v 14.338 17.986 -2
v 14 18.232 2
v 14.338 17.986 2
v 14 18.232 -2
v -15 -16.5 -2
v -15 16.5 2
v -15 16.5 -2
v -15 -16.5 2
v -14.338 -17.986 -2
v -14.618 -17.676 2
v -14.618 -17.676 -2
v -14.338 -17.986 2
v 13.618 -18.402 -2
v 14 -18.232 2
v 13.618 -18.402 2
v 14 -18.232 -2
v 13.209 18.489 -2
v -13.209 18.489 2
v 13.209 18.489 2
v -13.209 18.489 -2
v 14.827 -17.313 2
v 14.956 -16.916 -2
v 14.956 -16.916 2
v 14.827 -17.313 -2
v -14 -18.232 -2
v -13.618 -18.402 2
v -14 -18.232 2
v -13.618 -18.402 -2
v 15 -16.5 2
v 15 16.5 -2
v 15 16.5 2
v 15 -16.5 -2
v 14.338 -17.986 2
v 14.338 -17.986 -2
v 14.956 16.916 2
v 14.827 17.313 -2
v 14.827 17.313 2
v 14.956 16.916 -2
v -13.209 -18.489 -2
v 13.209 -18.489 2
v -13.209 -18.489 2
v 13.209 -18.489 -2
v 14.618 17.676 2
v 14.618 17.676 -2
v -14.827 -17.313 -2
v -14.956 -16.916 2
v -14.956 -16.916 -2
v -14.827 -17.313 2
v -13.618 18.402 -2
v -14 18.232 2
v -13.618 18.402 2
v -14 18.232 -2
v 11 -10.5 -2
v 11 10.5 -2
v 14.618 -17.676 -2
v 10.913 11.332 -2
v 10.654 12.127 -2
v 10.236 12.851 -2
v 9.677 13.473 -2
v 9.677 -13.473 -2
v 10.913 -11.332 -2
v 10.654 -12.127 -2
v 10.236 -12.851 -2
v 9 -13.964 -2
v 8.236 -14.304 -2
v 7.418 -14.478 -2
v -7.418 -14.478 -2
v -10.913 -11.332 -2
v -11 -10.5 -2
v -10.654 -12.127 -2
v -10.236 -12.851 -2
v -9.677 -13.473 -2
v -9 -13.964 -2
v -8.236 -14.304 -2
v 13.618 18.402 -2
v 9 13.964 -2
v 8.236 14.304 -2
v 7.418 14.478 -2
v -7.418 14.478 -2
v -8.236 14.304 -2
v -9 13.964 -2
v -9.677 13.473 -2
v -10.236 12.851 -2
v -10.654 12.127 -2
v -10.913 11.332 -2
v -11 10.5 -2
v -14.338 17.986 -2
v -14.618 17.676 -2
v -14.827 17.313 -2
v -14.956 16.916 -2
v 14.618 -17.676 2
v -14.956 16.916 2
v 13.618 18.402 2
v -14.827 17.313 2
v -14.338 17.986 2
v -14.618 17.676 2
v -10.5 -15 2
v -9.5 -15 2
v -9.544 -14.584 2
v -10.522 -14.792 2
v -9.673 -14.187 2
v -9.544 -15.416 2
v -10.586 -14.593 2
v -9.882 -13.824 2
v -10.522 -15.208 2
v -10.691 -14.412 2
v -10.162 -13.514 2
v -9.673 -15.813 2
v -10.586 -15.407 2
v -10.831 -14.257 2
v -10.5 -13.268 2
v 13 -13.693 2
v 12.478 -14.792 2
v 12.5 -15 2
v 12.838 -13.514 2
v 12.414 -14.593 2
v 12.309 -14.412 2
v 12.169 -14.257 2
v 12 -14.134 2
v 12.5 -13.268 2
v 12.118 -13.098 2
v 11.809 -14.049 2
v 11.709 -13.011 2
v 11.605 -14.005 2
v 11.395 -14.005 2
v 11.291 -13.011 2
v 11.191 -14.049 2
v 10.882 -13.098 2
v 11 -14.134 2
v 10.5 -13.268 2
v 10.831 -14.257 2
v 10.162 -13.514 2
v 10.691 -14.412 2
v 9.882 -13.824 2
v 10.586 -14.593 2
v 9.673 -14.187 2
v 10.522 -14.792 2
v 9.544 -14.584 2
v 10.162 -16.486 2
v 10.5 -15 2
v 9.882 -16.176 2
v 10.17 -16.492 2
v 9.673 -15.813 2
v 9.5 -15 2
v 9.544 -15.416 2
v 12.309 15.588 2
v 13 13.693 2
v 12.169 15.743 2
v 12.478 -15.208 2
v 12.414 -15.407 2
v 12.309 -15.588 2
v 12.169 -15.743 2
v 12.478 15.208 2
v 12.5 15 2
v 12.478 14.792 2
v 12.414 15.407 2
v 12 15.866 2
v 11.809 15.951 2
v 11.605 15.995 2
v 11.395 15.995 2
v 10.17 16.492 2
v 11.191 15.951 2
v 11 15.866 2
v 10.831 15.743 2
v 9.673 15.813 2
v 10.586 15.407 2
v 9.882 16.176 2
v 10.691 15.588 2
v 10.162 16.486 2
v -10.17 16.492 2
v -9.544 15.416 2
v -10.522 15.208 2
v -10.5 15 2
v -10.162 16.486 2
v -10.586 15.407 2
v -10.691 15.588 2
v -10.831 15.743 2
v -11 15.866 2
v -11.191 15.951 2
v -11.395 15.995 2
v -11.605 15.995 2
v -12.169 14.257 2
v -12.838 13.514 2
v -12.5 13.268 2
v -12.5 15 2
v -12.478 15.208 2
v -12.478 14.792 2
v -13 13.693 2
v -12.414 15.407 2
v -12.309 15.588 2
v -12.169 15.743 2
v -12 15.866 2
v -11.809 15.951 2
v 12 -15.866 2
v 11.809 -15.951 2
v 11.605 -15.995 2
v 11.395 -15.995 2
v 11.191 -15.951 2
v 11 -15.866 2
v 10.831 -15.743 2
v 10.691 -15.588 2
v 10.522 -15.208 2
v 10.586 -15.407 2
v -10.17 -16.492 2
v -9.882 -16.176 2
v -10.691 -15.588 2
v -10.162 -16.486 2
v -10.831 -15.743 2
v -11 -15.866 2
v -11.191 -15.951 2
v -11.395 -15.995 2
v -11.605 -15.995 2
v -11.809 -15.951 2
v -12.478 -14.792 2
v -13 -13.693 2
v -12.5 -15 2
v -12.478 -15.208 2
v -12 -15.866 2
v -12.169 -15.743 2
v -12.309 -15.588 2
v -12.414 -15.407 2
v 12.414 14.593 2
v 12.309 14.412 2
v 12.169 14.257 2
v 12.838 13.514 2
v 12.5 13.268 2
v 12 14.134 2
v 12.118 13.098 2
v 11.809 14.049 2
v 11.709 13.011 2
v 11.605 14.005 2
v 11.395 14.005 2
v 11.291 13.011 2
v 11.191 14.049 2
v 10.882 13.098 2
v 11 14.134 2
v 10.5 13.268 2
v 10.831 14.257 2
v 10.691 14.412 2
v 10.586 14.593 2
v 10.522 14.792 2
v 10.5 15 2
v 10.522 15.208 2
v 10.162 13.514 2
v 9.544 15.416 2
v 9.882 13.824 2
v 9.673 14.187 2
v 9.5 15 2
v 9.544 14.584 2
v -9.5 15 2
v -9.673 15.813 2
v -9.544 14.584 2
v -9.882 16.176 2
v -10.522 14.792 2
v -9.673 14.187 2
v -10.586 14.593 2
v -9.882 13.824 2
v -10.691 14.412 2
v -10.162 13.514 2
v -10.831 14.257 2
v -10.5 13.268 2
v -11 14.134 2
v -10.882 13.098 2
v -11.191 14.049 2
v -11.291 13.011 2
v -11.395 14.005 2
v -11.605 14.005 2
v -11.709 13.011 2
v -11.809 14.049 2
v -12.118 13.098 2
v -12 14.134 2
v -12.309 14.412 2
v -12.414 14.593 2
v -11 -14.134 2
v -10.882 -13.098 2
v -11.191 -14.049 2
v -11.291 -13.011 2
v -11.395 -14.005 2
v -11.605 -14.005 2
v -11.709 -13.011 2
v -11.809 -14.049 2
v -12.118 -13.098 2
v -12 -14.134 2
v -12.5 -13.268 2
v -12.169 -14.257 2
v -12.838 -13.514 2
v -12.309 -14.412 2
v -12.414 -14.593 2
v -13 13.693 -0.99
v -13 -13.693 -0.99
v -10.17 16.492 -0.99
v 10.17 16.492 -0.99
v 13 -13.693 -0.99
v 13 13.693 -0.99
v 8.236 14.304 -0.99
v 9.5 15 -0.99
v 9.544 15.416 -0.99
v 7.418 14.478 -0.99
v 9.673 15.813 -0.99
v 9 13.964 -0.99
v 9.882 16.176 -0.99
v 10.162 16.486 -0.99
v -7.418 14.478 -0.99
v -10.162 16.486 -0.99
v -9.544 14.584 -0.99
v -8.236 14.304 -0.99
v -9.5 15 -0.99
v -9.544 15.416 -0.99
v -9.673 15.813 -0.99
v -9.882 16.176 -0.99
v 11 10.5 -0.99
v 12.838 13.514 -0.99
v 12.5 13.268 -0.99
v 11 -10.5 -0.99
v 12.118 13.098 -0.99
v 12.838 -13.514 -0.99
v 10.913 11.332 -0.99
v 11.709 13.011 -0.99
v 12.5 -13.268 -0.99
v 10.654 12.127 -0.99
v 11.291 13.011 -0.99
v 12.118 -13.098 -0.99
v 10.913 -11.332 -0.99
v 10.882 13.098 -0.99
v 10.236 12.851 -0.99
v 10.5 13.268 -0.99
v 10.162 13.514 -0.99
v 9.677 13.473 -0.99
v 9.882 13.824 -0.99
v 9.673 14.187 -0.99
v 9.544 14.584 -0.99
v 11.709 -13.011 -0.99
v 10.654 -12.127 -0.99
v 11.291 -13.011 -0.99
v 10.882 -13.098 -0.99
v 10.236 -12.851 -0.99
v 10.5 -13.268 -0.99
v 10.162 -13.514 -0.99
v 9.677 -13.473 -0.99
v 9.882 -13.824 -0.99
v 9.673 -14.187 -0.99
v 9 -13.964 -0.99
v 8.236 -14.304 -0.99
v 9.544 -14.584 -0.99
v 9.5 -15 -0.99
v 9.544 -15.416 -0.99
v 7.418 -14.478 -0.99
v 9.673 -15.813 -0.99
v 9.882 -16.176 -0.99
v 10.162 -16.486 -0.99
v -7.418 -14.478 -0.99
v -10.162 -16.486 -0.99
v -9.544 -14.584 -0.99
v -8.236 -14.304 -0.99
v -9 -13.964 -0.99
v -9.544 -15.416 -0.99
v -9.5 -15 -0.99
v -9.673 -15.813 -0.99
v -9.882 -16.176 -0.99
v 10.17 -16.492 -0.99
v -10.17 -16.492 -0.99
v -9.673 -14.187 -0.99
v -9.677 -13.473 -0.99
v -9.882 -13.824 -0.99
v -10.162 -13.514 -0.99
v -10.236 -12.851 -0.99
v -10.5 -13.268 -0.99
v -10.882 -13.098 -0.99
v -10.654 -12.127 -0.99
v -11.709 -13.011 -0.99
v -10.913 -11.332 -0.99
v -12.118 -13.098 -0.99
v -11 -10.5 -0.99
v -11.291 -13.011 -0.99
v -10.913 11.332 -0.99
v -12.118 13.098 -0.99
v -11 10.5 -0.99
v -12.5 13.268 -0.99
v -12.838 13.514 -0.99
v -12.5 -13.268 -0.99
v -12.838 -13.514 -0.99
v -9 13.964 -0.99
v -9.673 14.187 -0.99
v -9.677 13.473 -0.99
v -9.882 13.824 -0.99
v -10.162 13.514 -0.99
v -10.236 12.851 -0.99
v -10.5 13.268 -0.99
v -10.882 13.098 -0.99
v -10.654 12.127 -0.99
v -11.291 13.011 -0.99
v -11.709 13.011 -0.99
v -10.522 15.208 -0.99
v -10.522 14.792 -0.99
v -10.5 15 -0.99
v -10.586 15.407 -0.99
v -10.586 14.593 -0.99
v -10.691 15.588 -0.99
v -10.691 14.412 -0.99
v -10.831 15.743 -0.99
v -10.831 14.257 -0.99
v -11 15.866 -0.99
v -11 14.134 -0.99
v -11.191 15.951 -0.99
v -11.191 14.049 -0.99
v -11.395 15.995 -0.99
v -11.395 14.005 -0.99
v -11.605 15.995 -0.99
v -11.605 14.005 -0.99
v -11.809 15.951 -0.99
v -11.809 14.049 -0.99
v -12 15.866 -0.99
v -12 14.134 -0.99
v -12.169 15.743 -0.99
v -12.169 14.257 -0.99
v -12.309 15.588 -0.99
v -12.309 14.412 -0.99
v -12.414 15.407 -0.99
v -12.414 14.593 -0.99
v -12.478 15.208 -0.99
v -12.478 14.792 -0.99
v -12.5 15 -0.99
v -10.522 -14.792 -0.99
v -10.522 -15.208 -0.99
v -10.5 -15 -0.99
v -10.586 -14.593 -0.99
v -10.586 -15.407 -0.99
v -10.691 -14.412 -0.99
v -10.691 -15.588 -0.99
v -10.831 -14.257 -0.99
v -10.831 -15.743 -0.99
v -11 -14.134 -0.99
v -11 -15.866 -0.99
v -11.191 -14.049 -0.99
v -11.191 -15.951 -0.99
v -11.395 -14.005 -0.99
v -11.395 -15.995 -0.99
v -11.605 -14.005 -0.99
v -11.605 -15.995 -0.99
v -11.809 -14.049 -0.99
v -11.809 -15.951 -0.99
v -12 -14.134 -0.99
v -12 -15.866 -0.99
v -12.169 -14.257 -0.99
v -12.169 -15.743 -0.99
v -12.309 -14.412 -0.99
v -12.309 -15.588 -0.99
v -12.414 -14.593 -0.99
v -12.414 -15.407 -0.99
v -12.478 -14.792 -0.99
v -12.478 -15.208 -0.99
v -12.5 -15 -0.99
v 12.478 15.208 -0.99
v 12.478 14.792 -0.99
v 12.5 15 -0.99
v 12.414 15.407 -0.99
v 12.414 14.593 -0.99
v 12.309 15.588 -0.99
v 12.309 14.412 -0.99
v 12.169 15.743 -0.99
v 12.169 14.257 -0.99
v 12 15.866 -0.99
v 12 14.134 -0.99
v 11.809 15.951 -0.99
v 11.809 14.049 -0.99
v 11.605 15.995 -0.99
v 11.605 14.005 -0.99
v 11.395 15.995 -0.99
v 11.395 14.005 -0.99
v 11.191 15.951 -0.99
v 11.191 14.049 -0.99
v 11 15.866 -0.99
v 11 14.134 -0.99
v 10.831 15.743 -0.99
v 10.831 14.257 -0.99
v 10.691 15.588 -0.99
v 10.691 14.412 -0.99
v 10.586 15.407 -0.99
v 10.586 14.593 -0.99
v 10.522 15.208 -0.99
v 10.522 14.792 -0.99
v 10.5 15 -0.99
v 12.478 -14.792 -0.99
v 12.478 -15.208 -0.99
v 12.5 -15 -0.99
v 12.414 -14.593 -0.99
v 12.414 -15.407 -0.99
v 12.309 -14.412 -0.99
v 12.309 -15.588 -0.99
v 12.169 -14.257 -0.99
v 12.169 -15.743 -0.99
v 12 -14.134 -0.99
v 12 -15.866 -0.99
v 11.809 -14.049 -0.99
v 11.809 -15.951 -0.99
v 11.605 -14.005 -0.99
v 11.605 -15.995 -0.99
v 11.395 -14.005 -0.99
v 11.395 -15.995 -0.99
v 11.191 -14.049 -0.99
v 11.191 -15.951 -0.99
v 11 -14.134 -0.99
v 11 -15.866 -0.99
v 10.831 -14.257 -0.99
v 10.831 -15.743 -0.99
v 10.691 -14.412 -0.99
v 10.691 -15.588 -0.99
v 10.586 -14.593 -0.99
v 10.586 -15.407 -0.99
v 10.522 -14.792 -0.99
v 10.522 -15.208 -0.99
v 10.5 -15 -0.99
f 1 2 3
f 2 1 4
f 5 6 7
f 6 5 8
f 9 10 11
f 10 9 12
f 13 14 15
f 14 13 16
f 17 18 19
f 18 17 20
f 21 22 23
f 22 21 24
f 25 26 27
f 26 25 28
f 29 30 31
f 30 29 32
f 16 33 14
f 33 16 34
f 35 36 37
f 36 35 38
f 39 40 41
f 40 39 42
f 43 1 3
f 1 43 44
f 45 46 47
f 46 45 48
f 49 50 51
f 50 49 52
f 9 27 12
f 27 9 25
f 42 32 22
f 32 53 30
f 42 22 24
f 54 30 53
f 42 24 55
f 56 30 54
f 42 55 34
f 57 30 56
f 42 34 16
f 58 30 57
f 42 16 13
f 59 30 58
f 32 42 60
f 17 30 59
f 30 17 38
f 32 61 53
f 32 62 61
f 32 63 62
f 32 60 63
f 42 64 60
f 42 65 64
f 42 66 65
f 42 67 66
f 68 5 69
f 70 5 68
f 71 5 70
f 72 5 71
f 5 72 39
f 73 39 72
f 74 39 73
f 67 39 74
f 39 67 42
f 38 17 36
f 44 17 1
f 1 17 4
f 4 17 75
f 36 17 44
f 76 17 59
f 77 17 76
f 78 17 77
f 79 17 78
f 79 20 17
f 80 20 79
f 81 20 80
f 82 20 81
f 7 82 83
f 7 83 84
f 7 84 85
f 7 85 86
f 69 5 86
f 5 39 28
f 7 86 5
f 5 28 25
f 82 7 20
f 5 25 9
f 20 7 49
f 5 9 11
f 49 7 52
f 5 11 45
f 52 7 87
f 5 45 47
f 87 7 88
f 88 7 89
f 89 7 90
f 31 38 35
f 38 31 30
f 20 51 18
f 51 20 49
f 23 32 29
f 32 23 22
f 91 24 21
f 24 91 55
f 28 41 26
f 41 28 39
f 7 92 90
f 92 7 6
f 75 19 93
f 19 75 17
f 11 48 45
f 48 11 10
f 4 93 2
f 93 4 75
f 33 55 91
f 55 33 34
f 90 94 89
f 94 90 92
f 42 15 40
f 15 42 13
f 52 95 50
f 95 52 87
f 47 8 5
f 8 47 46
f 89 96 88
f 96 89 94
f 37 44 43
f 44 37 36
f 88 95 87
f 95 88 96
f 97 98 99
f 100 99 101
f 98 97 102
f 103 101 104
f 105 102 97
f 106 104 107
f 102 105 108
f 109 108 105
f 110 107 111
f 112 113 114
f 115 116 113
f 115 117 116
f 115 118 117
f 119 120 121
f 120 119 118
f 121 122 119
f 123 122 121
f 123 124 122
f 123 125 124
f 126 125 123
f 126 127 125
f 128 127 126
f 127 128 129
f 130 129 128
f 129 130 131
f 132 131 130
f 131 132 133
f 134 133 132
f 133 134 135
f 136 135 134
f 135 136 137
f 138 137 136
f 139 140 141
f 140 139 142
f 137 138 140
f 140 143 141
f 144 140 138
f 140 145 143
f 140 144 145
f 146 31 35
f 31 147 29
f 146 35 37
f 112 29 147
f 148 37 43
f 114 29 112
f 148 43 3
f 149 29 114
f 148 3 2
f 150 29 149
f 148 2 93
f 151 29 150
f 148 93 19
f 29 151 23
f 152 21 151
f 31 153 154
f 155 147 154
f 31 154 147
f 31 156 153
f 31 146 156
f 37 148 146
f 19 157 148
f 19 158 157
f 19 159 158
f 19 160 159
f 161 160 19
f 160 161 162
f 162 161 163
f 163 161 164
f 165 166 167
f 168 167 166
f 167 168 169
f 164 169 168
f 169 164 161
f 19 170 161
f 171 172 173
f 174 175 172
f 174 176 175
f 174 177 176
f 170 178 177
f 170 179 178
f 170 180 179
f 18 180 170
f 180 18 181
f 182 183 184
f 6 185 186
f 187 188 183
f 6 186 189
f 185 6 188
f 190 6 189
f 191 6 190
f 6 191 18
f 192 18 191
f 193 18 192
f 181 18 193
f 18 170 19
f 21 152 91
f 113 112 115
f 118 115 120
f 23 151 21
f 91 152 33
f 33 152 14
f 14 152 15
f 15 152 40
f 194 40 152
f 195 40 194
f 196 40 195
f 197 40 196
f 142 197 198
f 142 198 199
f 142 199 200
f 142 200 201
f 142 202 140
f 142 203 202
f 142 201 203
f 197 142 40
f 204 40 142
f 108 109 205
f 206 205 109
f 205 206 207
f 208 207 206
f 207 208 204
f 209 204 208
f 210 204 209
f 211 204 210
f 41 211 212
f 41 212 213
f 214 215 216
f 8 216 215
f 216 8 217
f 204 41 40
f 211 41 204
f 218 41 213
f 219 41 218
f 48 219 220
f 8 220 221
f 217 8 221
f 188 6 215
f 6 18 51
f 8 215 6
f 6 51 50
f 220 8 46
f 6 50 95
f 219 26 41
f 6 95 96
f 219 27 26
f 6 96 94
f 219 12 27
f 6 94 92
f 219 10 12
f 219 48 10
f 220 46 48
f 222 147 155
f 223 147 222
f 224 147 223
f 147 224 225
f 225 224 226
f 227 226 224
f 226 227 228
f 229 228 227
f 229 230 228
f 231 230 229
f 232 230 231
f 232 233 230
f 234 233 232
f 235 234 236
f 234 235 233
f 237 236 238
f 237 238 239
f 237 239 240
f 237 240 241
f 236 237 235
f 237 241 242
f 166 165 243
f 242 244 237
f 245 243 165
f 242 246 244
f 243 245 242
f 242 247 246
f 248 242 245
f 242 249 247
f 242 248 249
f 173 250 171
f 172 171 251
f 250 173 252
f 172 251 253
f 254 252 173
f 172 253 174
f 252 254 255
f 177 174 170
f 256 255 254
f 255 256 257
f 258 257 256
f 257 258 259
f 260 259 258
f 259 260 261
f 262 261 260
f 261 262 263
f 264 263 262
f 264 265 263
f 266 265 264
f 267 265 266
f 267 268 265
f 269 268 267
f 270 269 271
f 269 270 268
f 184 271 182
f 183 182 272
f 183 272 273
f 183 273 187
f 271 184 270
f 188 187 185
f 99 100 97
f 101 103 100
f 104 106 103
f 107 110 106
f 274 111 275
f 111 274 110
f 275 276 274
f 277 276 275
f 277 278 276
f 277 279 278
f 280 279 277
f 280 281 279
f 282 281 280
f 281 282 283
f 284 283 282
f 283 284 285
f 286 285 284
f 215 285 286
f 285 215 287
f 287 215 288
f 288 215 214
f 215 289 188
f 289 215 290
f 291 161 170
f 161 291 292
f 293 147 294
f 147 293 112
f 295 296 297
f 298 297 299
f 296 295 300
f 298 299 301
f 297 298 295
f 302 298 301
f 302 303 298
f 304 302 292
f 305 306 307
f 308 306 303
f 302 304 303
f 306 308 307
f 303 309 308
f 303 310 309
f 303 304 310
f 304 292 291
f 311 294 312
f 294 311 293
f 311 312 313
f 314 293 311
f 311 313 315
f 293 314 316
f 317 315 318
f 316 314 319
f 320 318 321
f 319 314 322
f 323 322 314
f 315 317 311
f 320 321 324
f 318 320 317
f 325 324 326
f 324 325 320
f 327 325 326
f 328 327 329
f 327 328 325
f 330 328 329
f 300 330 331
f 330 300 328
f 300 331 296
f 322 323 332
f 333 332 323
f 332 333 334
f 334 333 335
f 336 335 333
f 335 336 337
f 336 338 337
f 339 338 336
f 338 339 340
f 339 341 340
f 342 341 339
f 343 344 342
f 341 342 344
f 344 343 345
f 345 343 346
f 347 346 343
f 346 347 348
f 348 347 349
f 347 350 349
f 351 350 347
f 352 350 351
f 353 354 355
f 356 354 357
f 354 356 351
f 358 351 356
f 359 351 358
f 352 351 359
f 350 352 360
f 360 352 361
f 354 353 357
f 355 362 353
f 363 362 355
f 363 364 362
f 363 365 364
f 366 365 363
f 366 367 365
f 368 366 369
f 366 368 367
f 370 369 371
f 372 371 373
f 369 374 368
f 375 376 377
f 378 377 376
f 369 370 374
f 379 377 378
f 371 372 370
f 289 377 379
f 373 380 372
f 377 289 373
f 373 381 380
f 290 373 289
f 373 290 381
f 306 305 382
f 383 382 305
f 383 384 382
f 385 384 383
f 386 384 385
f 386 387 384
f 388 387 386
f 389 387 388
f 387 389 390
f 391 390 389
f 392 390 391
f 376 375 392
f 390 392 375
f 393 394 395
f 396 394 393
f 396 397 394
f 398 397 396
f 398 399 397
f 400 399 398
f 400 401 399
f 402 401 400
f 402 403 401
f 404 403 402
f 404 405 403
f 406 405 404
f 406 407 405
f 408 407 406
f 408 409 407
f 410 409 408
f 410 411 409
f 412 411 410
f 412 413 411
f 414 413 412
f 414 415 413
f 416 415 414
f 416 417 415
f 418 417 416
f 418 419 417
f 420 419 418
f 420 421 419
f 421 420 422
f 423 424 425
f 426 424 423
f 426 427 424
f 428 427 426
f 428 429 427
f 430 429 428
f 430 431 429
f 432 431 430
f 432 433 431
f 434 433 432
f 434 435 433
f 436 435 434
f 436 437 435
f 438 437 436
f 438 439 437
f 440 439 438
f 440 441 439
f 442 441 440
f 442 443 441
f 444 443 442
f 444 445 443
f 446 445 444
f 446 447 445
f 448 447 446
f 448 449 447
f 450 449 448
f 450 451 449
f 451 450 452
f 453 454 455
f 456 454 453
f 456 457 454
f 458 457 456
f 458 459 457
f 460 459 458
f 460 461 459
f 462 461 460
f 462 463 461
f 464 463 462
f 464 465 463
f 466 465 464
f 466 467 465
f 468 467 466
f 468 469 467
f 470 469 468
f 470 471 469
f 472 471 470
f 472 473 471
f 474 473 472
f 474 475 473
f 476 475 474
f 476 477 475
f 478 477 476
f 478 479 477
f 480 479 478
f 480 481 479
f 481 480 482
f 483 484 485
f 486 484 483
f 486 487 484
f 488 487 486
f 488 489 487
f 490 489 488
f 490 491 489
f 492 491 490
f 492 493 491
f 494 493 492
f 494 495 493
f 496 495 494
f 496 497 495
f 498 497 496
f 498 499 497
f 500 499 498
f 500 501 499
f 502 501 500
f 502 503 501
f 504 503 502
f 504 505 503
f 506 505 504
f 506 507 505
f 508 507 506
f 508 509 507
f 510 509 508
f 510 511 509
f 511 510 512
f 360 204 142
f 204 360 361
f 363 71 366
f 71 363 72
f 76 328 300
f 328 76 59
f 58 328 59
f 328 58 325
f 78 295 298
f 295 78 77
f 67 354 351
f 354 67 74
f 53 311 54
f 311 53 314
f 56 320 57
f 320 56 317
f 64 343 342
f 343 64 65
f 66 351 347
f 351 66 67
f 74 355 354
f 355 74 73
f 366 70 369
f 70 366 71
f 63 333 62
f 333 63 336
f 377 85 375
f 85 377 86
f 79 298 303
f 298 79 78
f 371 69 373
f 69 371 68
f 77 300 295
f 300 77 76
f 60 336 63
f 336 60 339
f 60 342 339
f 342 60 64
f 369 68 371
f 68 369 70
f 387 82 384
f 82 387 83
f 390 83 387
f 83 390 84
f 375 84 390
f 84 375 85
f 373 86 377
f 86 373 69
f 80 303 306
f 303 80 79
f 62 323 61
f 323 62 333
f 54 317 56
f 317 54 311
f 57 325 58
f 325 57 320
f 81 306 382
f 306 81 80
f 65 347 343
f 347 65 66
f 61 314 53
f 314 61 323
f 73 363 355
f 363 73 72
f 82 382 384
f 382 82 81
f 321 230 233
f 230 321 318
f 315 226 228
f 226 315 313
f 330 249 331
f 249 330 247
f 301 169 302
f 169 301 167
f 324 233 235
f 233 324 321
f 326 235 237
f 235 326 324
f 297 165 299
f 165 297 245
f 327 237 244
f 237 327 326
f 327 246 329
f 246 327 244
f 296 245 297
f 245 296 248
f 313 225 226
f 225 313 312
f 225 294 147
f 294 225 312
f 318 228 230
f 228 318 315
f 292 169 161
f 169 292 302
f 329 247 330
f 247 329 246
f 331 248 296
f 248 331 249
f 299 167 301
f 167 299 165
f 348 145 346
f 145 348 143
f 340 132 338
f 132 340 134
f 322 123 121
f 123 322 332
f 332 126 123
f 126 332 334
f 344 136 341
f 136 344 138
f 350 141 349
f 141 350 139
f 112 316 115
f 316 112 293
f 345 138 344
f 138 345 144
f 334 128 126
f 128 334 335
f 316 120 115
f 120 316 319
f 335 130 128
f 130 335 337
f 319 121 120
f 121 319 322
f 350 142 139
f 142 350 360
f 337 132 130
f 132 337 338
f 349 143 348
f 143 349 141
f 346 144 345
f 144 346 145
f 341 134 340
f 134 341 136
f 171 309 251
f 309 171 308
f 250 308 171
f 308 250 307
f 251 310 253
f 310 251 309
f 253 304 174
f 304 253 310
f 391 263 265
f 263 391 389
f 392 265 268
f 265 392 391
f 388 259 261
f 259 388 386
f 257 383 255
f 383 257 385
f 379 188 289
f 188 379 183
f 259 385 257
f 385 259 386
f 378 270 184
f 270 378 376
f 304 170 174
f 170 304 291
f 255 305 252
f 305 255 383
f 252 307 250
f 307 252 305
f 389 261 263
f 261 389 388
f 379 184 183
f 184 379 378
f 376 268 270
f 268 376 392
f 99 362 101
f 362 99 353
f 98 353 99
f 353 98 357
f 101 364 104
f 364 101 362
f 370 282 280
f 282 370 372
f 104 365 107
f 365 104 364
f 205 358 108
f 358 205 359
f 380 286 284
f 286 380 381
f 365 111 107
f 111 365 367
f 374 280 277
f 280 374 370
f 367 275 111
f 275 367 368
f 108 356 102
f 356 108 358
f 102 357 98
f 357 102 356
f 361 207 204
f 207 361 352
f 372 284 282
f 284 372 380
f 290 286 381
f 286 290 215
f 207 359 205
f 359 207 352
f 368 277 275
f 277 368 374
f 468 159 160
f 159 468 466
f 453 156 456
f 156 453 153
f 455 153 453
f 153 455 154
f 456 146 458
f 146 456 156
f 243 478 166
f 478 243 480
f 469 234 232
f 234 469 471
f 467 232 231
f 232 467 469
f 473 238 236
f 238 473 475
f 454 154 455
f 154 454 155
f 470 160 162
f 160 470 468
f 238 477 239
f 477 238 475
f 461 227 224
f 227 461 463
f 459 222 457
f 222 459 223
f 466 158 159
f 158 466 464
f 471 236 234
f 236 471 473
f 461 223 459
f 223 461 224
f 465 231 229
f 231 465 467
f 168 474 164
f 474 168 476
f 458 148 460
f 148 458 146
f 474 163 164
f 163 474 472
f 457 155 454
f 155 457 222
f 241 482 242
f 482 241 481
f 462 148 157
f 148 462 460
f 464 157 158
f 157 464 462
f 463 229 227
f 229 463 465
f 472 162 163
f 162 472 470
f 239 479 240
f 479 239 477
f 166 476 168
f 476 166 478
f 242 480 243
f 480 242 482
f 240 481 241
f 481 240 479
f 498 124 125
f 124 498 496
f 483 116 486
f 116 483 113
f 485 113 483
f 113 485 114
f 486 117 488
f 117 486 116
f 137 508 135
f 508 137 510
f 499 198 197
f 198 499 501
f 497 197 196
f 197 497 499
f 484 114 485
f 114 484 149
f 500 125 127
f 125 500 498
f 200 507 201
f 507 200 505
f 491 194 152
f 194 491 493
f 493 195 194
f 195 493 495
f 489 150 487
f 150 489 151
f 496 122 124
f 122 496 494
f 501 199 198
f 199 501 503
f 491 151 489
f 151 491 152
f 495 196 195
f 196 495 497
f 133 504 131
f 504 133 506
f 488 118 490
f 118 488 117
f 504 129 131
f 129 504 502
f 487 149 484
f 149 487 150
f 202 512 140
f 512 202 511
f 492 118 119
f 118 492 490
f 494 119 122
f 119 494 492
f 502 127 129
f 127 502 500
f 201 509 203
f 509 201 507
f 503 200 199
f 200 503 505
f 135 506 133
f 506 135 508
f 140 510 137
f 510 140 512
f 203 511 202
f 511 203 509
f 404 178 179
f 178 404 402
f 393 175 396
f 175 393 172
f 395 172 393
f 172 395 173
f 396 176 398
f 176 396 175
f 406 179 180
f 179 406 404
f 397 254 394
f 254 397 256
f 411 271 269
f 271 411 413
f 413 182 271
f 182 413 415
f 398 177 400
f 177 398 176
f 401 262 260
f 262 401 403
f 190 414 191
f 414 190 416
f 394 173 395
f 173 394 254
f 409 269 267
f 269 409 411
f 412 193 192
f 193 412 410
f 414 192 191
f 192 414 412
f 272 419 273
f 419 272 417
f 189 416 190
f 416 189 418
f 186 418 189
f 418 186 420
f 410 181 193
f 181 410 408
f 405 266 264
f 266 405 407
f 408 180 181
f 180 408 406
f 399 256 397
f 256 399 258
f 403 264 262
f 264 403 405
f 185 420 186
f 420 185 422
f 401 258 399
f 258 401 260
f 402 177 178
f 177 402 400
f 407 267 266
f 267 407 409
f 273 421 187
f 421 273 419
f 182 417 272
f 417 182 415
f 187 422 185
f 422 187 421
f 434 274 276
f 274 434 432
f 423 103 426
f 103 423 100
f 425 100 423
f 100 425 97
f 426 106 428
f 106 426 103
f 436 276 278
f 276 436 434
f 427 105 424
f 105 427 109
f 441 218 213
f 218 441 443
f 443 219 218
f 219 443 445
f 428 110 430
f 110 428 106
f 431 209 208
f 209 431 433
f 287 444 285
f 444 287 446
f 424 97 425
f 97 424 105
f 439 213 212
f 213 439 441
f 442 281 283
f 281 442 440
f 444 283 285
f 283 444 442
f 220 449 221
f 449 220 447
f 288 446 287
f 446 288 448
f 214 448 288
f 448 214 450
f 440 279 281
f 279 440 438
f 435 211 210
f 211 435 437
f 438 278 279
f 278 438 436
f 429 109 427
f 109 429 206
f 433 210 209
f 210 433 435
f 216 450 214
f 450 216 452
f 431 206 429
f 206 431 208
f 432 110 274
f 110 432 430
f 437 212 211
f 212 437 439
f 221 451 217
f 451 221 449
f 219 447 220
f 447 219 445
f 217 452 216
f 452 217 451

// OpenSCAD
// file: ../../scadLib/library.scad
////////////////////////////////////////////////////////////////////////////////////////////////////
module plate4Point(x,y,z,d){
	hull(){
		color("green") translate([(x/2)-(d/2) ,(y/2) -(d/2),0]) cylinder(h=z, d=d, center=true);
		color("blue")  translate([(x/2)-(d/2) ,-(y/2)+(d/2),0]) cylinder(h=z, d=d, center=true);
		color("red")   translate([-(x/2)+(d/2),(y/2) -(d/2),0]) cylinder(h=z, d=d, center=true);
		color("grey")  translate([-(x/2)+(d/2),-(y/2)+(d/2),0]) cylinder(h=z, d=d, center=true);
	}
}
////////////////////////////////////////////////////////////////////////////////////////////////////
module plate2Point(x,z,d){
	hull(){
		color("green") translate([(x/2) -(d/2),0 ,0]) cylinder(h=z, d=d, center=true);
		color("blue")  translate([-(x/2)+(d/2),0 ,0]) cylinder(h=z, d=d, center=true);
	}
}
////////////////////////////////////////////////////////////////////////////////////////////////////
module triagleSphere(iX, iY, iZ, iD){
	
	halfD = iD/2;
	hull(){
		color("red")		translate([-halfD   , (iY/2)-halfD, halfD]) sphere(d=iD);	
		color("grey")		translate([-iX+halfD, (iY/2)-halfD, halfD]) sphere(d=iD);
		color("green")	translate([-halfD   , (iY/2)-halfD, iZ-halfD]) sphere(d=iD);

		color("red")		translate([-halfD   , -(iY/2)+halfD, halfD]) sphere(d=iD);
		color("grey")		translate([-iX+halfD, -(iY/2)+halfD, halfD]) sphere(d=iD);
		color("green")	translate([-halfD   , -(iY/2)+halfD, iZ-halfD]) sphere(d=iD);
	}
}
////////////////////////////////////////////////////////////////////////////////////////////////////
module cubeSphere(iX, iYm, iZ, iD){

	edgeDiamitor = iD;
	
	hull(){
		for(a=[[1,1,1],[-1,1,1],[1,-1,1],[-1,-1,1],[1,1,-1],[-1,1,-1],[1,-1,-1],[-1,-1,-1]]){
			translate([
				a[0]*((iX/2) -(edgeDiamitor/2)), 
				a[1]*((iYm/2)-(edgeDiamitor/2)), 
				a[2]*((iZ/2) -(edgeDiamitor/2))]) sphere(d=edgeDiamitor);
		}
	}
} 
////////////////////////////////////////////////////////////////////////////////////////////////////
module mText(l, letter_size = 10, letter_height = 4) {
// Use linear_extrude() to make the letters 3D objects as they
// are only 2D shapes when only using text()
	font = "Bitstream Vera Sans:style=Bold" ;
	linear_extrude(height = letter_height) {
		text(l, size = letter_size, font = font, halign = "center", valign = "center", $fn = 16);
	}
}
module roundedTrapezoid(x1=1, y1=1,x2=1, y2=1, z1=1, d1=6){
  hull(){
  // top Right
    translate([-x1,y1,0])
      cylinder(h=z1,d=d1,center=true);
  // Top Left
    translate([-x1,-y1,0])
      cylinder(h=z1,d=d1,center=true);
  // Bottom Right
    translate([-x2,y2,0])
      cylinder(h=z1,d=d1,center=true);
  // Bottom Left
    translate([-x2,-y2,0])
      cylinder(h=z1,d=d1,center=true);
  }
}
// main file
$fn=30;

use <../../scadLib/library.scad>;

tinyUpsBoardWidth = 26;
tinyUpsBoardLength = 33;
tinyUpsBoardDepth = 1.66;
tinyUpsBoardCornerRadious = 3;
tinyUpsBoardCornerOffset = 1.5;
tinyUpsBoardMountHoleDiamiter = 2.85;
tinyUpsBoardMountHoleWidthOC = 22.83;
tinyUpsBoardMountHoleLengthOC = 29.78;

M2SizeT = 2.0;
M2SizeS = 2.4;

M3SizeT = 3.2;
M3SizeS = 3.5;

M4SizeT = 4.2;
M4SizeS = 4.4;


//translate([0,0,4]) tinyUpsBoard();

tinyUpsTray();

////////////////////////////////////////////////////////////////////////////////////////////////////
module tinyUpsTray(){
	difference(){
		plate4Point(tinyUpsBoardWidth+4,tinyUpsBoardLength+4,4,4);
		translate([0,0,.51]) plate4Point(tinyUpsBoardWidth,tinyUpsBoardLength,3,tinyUpsBoardMountHoleDiamiter);
		plate4Point(tinyUpsBoardWidth-4,tinyUpsBoardLength-4,6,8);
	}
	difference(){
		tinyUpsHolePoints(4,4);
		tinyUpsHolePoints(M2SizeT);
	}
}
////////////////////////////////////////////////////////////////////////////////////////////////////
module tinyUpsBoard(){
	difference(){
		plate4Point(tinyUpsBoardWidth,tinyUpsBoardLength,tinyUpsBoardDepth,tinyUpsBoardMountHoleDiamiter);
		tinyUpsHolePoints(tinyUpsBoardMountHoleDiamiter);
	}
}
////////////////////////////////////////////////////////////////////////////////////////////////////
module tinyUpsHolePoints(iDiamiter,iHeigth=10){
	
	for(a=[[1,1],[1,-1],[-1,1],[-1,-1]]){
		translate([
			a[0]*(tinyUpsBoardWidth/2)-(a[0]*tinyUpsBoardCornerOffset),
			a[1]*(tinyUpsBoardLength/2)-(a[1]*tinyUpsBoardCornerOffset),
			0]) 
			cylinder(h=iHeigth,d=iDiamiter,center=true);
	}
}
